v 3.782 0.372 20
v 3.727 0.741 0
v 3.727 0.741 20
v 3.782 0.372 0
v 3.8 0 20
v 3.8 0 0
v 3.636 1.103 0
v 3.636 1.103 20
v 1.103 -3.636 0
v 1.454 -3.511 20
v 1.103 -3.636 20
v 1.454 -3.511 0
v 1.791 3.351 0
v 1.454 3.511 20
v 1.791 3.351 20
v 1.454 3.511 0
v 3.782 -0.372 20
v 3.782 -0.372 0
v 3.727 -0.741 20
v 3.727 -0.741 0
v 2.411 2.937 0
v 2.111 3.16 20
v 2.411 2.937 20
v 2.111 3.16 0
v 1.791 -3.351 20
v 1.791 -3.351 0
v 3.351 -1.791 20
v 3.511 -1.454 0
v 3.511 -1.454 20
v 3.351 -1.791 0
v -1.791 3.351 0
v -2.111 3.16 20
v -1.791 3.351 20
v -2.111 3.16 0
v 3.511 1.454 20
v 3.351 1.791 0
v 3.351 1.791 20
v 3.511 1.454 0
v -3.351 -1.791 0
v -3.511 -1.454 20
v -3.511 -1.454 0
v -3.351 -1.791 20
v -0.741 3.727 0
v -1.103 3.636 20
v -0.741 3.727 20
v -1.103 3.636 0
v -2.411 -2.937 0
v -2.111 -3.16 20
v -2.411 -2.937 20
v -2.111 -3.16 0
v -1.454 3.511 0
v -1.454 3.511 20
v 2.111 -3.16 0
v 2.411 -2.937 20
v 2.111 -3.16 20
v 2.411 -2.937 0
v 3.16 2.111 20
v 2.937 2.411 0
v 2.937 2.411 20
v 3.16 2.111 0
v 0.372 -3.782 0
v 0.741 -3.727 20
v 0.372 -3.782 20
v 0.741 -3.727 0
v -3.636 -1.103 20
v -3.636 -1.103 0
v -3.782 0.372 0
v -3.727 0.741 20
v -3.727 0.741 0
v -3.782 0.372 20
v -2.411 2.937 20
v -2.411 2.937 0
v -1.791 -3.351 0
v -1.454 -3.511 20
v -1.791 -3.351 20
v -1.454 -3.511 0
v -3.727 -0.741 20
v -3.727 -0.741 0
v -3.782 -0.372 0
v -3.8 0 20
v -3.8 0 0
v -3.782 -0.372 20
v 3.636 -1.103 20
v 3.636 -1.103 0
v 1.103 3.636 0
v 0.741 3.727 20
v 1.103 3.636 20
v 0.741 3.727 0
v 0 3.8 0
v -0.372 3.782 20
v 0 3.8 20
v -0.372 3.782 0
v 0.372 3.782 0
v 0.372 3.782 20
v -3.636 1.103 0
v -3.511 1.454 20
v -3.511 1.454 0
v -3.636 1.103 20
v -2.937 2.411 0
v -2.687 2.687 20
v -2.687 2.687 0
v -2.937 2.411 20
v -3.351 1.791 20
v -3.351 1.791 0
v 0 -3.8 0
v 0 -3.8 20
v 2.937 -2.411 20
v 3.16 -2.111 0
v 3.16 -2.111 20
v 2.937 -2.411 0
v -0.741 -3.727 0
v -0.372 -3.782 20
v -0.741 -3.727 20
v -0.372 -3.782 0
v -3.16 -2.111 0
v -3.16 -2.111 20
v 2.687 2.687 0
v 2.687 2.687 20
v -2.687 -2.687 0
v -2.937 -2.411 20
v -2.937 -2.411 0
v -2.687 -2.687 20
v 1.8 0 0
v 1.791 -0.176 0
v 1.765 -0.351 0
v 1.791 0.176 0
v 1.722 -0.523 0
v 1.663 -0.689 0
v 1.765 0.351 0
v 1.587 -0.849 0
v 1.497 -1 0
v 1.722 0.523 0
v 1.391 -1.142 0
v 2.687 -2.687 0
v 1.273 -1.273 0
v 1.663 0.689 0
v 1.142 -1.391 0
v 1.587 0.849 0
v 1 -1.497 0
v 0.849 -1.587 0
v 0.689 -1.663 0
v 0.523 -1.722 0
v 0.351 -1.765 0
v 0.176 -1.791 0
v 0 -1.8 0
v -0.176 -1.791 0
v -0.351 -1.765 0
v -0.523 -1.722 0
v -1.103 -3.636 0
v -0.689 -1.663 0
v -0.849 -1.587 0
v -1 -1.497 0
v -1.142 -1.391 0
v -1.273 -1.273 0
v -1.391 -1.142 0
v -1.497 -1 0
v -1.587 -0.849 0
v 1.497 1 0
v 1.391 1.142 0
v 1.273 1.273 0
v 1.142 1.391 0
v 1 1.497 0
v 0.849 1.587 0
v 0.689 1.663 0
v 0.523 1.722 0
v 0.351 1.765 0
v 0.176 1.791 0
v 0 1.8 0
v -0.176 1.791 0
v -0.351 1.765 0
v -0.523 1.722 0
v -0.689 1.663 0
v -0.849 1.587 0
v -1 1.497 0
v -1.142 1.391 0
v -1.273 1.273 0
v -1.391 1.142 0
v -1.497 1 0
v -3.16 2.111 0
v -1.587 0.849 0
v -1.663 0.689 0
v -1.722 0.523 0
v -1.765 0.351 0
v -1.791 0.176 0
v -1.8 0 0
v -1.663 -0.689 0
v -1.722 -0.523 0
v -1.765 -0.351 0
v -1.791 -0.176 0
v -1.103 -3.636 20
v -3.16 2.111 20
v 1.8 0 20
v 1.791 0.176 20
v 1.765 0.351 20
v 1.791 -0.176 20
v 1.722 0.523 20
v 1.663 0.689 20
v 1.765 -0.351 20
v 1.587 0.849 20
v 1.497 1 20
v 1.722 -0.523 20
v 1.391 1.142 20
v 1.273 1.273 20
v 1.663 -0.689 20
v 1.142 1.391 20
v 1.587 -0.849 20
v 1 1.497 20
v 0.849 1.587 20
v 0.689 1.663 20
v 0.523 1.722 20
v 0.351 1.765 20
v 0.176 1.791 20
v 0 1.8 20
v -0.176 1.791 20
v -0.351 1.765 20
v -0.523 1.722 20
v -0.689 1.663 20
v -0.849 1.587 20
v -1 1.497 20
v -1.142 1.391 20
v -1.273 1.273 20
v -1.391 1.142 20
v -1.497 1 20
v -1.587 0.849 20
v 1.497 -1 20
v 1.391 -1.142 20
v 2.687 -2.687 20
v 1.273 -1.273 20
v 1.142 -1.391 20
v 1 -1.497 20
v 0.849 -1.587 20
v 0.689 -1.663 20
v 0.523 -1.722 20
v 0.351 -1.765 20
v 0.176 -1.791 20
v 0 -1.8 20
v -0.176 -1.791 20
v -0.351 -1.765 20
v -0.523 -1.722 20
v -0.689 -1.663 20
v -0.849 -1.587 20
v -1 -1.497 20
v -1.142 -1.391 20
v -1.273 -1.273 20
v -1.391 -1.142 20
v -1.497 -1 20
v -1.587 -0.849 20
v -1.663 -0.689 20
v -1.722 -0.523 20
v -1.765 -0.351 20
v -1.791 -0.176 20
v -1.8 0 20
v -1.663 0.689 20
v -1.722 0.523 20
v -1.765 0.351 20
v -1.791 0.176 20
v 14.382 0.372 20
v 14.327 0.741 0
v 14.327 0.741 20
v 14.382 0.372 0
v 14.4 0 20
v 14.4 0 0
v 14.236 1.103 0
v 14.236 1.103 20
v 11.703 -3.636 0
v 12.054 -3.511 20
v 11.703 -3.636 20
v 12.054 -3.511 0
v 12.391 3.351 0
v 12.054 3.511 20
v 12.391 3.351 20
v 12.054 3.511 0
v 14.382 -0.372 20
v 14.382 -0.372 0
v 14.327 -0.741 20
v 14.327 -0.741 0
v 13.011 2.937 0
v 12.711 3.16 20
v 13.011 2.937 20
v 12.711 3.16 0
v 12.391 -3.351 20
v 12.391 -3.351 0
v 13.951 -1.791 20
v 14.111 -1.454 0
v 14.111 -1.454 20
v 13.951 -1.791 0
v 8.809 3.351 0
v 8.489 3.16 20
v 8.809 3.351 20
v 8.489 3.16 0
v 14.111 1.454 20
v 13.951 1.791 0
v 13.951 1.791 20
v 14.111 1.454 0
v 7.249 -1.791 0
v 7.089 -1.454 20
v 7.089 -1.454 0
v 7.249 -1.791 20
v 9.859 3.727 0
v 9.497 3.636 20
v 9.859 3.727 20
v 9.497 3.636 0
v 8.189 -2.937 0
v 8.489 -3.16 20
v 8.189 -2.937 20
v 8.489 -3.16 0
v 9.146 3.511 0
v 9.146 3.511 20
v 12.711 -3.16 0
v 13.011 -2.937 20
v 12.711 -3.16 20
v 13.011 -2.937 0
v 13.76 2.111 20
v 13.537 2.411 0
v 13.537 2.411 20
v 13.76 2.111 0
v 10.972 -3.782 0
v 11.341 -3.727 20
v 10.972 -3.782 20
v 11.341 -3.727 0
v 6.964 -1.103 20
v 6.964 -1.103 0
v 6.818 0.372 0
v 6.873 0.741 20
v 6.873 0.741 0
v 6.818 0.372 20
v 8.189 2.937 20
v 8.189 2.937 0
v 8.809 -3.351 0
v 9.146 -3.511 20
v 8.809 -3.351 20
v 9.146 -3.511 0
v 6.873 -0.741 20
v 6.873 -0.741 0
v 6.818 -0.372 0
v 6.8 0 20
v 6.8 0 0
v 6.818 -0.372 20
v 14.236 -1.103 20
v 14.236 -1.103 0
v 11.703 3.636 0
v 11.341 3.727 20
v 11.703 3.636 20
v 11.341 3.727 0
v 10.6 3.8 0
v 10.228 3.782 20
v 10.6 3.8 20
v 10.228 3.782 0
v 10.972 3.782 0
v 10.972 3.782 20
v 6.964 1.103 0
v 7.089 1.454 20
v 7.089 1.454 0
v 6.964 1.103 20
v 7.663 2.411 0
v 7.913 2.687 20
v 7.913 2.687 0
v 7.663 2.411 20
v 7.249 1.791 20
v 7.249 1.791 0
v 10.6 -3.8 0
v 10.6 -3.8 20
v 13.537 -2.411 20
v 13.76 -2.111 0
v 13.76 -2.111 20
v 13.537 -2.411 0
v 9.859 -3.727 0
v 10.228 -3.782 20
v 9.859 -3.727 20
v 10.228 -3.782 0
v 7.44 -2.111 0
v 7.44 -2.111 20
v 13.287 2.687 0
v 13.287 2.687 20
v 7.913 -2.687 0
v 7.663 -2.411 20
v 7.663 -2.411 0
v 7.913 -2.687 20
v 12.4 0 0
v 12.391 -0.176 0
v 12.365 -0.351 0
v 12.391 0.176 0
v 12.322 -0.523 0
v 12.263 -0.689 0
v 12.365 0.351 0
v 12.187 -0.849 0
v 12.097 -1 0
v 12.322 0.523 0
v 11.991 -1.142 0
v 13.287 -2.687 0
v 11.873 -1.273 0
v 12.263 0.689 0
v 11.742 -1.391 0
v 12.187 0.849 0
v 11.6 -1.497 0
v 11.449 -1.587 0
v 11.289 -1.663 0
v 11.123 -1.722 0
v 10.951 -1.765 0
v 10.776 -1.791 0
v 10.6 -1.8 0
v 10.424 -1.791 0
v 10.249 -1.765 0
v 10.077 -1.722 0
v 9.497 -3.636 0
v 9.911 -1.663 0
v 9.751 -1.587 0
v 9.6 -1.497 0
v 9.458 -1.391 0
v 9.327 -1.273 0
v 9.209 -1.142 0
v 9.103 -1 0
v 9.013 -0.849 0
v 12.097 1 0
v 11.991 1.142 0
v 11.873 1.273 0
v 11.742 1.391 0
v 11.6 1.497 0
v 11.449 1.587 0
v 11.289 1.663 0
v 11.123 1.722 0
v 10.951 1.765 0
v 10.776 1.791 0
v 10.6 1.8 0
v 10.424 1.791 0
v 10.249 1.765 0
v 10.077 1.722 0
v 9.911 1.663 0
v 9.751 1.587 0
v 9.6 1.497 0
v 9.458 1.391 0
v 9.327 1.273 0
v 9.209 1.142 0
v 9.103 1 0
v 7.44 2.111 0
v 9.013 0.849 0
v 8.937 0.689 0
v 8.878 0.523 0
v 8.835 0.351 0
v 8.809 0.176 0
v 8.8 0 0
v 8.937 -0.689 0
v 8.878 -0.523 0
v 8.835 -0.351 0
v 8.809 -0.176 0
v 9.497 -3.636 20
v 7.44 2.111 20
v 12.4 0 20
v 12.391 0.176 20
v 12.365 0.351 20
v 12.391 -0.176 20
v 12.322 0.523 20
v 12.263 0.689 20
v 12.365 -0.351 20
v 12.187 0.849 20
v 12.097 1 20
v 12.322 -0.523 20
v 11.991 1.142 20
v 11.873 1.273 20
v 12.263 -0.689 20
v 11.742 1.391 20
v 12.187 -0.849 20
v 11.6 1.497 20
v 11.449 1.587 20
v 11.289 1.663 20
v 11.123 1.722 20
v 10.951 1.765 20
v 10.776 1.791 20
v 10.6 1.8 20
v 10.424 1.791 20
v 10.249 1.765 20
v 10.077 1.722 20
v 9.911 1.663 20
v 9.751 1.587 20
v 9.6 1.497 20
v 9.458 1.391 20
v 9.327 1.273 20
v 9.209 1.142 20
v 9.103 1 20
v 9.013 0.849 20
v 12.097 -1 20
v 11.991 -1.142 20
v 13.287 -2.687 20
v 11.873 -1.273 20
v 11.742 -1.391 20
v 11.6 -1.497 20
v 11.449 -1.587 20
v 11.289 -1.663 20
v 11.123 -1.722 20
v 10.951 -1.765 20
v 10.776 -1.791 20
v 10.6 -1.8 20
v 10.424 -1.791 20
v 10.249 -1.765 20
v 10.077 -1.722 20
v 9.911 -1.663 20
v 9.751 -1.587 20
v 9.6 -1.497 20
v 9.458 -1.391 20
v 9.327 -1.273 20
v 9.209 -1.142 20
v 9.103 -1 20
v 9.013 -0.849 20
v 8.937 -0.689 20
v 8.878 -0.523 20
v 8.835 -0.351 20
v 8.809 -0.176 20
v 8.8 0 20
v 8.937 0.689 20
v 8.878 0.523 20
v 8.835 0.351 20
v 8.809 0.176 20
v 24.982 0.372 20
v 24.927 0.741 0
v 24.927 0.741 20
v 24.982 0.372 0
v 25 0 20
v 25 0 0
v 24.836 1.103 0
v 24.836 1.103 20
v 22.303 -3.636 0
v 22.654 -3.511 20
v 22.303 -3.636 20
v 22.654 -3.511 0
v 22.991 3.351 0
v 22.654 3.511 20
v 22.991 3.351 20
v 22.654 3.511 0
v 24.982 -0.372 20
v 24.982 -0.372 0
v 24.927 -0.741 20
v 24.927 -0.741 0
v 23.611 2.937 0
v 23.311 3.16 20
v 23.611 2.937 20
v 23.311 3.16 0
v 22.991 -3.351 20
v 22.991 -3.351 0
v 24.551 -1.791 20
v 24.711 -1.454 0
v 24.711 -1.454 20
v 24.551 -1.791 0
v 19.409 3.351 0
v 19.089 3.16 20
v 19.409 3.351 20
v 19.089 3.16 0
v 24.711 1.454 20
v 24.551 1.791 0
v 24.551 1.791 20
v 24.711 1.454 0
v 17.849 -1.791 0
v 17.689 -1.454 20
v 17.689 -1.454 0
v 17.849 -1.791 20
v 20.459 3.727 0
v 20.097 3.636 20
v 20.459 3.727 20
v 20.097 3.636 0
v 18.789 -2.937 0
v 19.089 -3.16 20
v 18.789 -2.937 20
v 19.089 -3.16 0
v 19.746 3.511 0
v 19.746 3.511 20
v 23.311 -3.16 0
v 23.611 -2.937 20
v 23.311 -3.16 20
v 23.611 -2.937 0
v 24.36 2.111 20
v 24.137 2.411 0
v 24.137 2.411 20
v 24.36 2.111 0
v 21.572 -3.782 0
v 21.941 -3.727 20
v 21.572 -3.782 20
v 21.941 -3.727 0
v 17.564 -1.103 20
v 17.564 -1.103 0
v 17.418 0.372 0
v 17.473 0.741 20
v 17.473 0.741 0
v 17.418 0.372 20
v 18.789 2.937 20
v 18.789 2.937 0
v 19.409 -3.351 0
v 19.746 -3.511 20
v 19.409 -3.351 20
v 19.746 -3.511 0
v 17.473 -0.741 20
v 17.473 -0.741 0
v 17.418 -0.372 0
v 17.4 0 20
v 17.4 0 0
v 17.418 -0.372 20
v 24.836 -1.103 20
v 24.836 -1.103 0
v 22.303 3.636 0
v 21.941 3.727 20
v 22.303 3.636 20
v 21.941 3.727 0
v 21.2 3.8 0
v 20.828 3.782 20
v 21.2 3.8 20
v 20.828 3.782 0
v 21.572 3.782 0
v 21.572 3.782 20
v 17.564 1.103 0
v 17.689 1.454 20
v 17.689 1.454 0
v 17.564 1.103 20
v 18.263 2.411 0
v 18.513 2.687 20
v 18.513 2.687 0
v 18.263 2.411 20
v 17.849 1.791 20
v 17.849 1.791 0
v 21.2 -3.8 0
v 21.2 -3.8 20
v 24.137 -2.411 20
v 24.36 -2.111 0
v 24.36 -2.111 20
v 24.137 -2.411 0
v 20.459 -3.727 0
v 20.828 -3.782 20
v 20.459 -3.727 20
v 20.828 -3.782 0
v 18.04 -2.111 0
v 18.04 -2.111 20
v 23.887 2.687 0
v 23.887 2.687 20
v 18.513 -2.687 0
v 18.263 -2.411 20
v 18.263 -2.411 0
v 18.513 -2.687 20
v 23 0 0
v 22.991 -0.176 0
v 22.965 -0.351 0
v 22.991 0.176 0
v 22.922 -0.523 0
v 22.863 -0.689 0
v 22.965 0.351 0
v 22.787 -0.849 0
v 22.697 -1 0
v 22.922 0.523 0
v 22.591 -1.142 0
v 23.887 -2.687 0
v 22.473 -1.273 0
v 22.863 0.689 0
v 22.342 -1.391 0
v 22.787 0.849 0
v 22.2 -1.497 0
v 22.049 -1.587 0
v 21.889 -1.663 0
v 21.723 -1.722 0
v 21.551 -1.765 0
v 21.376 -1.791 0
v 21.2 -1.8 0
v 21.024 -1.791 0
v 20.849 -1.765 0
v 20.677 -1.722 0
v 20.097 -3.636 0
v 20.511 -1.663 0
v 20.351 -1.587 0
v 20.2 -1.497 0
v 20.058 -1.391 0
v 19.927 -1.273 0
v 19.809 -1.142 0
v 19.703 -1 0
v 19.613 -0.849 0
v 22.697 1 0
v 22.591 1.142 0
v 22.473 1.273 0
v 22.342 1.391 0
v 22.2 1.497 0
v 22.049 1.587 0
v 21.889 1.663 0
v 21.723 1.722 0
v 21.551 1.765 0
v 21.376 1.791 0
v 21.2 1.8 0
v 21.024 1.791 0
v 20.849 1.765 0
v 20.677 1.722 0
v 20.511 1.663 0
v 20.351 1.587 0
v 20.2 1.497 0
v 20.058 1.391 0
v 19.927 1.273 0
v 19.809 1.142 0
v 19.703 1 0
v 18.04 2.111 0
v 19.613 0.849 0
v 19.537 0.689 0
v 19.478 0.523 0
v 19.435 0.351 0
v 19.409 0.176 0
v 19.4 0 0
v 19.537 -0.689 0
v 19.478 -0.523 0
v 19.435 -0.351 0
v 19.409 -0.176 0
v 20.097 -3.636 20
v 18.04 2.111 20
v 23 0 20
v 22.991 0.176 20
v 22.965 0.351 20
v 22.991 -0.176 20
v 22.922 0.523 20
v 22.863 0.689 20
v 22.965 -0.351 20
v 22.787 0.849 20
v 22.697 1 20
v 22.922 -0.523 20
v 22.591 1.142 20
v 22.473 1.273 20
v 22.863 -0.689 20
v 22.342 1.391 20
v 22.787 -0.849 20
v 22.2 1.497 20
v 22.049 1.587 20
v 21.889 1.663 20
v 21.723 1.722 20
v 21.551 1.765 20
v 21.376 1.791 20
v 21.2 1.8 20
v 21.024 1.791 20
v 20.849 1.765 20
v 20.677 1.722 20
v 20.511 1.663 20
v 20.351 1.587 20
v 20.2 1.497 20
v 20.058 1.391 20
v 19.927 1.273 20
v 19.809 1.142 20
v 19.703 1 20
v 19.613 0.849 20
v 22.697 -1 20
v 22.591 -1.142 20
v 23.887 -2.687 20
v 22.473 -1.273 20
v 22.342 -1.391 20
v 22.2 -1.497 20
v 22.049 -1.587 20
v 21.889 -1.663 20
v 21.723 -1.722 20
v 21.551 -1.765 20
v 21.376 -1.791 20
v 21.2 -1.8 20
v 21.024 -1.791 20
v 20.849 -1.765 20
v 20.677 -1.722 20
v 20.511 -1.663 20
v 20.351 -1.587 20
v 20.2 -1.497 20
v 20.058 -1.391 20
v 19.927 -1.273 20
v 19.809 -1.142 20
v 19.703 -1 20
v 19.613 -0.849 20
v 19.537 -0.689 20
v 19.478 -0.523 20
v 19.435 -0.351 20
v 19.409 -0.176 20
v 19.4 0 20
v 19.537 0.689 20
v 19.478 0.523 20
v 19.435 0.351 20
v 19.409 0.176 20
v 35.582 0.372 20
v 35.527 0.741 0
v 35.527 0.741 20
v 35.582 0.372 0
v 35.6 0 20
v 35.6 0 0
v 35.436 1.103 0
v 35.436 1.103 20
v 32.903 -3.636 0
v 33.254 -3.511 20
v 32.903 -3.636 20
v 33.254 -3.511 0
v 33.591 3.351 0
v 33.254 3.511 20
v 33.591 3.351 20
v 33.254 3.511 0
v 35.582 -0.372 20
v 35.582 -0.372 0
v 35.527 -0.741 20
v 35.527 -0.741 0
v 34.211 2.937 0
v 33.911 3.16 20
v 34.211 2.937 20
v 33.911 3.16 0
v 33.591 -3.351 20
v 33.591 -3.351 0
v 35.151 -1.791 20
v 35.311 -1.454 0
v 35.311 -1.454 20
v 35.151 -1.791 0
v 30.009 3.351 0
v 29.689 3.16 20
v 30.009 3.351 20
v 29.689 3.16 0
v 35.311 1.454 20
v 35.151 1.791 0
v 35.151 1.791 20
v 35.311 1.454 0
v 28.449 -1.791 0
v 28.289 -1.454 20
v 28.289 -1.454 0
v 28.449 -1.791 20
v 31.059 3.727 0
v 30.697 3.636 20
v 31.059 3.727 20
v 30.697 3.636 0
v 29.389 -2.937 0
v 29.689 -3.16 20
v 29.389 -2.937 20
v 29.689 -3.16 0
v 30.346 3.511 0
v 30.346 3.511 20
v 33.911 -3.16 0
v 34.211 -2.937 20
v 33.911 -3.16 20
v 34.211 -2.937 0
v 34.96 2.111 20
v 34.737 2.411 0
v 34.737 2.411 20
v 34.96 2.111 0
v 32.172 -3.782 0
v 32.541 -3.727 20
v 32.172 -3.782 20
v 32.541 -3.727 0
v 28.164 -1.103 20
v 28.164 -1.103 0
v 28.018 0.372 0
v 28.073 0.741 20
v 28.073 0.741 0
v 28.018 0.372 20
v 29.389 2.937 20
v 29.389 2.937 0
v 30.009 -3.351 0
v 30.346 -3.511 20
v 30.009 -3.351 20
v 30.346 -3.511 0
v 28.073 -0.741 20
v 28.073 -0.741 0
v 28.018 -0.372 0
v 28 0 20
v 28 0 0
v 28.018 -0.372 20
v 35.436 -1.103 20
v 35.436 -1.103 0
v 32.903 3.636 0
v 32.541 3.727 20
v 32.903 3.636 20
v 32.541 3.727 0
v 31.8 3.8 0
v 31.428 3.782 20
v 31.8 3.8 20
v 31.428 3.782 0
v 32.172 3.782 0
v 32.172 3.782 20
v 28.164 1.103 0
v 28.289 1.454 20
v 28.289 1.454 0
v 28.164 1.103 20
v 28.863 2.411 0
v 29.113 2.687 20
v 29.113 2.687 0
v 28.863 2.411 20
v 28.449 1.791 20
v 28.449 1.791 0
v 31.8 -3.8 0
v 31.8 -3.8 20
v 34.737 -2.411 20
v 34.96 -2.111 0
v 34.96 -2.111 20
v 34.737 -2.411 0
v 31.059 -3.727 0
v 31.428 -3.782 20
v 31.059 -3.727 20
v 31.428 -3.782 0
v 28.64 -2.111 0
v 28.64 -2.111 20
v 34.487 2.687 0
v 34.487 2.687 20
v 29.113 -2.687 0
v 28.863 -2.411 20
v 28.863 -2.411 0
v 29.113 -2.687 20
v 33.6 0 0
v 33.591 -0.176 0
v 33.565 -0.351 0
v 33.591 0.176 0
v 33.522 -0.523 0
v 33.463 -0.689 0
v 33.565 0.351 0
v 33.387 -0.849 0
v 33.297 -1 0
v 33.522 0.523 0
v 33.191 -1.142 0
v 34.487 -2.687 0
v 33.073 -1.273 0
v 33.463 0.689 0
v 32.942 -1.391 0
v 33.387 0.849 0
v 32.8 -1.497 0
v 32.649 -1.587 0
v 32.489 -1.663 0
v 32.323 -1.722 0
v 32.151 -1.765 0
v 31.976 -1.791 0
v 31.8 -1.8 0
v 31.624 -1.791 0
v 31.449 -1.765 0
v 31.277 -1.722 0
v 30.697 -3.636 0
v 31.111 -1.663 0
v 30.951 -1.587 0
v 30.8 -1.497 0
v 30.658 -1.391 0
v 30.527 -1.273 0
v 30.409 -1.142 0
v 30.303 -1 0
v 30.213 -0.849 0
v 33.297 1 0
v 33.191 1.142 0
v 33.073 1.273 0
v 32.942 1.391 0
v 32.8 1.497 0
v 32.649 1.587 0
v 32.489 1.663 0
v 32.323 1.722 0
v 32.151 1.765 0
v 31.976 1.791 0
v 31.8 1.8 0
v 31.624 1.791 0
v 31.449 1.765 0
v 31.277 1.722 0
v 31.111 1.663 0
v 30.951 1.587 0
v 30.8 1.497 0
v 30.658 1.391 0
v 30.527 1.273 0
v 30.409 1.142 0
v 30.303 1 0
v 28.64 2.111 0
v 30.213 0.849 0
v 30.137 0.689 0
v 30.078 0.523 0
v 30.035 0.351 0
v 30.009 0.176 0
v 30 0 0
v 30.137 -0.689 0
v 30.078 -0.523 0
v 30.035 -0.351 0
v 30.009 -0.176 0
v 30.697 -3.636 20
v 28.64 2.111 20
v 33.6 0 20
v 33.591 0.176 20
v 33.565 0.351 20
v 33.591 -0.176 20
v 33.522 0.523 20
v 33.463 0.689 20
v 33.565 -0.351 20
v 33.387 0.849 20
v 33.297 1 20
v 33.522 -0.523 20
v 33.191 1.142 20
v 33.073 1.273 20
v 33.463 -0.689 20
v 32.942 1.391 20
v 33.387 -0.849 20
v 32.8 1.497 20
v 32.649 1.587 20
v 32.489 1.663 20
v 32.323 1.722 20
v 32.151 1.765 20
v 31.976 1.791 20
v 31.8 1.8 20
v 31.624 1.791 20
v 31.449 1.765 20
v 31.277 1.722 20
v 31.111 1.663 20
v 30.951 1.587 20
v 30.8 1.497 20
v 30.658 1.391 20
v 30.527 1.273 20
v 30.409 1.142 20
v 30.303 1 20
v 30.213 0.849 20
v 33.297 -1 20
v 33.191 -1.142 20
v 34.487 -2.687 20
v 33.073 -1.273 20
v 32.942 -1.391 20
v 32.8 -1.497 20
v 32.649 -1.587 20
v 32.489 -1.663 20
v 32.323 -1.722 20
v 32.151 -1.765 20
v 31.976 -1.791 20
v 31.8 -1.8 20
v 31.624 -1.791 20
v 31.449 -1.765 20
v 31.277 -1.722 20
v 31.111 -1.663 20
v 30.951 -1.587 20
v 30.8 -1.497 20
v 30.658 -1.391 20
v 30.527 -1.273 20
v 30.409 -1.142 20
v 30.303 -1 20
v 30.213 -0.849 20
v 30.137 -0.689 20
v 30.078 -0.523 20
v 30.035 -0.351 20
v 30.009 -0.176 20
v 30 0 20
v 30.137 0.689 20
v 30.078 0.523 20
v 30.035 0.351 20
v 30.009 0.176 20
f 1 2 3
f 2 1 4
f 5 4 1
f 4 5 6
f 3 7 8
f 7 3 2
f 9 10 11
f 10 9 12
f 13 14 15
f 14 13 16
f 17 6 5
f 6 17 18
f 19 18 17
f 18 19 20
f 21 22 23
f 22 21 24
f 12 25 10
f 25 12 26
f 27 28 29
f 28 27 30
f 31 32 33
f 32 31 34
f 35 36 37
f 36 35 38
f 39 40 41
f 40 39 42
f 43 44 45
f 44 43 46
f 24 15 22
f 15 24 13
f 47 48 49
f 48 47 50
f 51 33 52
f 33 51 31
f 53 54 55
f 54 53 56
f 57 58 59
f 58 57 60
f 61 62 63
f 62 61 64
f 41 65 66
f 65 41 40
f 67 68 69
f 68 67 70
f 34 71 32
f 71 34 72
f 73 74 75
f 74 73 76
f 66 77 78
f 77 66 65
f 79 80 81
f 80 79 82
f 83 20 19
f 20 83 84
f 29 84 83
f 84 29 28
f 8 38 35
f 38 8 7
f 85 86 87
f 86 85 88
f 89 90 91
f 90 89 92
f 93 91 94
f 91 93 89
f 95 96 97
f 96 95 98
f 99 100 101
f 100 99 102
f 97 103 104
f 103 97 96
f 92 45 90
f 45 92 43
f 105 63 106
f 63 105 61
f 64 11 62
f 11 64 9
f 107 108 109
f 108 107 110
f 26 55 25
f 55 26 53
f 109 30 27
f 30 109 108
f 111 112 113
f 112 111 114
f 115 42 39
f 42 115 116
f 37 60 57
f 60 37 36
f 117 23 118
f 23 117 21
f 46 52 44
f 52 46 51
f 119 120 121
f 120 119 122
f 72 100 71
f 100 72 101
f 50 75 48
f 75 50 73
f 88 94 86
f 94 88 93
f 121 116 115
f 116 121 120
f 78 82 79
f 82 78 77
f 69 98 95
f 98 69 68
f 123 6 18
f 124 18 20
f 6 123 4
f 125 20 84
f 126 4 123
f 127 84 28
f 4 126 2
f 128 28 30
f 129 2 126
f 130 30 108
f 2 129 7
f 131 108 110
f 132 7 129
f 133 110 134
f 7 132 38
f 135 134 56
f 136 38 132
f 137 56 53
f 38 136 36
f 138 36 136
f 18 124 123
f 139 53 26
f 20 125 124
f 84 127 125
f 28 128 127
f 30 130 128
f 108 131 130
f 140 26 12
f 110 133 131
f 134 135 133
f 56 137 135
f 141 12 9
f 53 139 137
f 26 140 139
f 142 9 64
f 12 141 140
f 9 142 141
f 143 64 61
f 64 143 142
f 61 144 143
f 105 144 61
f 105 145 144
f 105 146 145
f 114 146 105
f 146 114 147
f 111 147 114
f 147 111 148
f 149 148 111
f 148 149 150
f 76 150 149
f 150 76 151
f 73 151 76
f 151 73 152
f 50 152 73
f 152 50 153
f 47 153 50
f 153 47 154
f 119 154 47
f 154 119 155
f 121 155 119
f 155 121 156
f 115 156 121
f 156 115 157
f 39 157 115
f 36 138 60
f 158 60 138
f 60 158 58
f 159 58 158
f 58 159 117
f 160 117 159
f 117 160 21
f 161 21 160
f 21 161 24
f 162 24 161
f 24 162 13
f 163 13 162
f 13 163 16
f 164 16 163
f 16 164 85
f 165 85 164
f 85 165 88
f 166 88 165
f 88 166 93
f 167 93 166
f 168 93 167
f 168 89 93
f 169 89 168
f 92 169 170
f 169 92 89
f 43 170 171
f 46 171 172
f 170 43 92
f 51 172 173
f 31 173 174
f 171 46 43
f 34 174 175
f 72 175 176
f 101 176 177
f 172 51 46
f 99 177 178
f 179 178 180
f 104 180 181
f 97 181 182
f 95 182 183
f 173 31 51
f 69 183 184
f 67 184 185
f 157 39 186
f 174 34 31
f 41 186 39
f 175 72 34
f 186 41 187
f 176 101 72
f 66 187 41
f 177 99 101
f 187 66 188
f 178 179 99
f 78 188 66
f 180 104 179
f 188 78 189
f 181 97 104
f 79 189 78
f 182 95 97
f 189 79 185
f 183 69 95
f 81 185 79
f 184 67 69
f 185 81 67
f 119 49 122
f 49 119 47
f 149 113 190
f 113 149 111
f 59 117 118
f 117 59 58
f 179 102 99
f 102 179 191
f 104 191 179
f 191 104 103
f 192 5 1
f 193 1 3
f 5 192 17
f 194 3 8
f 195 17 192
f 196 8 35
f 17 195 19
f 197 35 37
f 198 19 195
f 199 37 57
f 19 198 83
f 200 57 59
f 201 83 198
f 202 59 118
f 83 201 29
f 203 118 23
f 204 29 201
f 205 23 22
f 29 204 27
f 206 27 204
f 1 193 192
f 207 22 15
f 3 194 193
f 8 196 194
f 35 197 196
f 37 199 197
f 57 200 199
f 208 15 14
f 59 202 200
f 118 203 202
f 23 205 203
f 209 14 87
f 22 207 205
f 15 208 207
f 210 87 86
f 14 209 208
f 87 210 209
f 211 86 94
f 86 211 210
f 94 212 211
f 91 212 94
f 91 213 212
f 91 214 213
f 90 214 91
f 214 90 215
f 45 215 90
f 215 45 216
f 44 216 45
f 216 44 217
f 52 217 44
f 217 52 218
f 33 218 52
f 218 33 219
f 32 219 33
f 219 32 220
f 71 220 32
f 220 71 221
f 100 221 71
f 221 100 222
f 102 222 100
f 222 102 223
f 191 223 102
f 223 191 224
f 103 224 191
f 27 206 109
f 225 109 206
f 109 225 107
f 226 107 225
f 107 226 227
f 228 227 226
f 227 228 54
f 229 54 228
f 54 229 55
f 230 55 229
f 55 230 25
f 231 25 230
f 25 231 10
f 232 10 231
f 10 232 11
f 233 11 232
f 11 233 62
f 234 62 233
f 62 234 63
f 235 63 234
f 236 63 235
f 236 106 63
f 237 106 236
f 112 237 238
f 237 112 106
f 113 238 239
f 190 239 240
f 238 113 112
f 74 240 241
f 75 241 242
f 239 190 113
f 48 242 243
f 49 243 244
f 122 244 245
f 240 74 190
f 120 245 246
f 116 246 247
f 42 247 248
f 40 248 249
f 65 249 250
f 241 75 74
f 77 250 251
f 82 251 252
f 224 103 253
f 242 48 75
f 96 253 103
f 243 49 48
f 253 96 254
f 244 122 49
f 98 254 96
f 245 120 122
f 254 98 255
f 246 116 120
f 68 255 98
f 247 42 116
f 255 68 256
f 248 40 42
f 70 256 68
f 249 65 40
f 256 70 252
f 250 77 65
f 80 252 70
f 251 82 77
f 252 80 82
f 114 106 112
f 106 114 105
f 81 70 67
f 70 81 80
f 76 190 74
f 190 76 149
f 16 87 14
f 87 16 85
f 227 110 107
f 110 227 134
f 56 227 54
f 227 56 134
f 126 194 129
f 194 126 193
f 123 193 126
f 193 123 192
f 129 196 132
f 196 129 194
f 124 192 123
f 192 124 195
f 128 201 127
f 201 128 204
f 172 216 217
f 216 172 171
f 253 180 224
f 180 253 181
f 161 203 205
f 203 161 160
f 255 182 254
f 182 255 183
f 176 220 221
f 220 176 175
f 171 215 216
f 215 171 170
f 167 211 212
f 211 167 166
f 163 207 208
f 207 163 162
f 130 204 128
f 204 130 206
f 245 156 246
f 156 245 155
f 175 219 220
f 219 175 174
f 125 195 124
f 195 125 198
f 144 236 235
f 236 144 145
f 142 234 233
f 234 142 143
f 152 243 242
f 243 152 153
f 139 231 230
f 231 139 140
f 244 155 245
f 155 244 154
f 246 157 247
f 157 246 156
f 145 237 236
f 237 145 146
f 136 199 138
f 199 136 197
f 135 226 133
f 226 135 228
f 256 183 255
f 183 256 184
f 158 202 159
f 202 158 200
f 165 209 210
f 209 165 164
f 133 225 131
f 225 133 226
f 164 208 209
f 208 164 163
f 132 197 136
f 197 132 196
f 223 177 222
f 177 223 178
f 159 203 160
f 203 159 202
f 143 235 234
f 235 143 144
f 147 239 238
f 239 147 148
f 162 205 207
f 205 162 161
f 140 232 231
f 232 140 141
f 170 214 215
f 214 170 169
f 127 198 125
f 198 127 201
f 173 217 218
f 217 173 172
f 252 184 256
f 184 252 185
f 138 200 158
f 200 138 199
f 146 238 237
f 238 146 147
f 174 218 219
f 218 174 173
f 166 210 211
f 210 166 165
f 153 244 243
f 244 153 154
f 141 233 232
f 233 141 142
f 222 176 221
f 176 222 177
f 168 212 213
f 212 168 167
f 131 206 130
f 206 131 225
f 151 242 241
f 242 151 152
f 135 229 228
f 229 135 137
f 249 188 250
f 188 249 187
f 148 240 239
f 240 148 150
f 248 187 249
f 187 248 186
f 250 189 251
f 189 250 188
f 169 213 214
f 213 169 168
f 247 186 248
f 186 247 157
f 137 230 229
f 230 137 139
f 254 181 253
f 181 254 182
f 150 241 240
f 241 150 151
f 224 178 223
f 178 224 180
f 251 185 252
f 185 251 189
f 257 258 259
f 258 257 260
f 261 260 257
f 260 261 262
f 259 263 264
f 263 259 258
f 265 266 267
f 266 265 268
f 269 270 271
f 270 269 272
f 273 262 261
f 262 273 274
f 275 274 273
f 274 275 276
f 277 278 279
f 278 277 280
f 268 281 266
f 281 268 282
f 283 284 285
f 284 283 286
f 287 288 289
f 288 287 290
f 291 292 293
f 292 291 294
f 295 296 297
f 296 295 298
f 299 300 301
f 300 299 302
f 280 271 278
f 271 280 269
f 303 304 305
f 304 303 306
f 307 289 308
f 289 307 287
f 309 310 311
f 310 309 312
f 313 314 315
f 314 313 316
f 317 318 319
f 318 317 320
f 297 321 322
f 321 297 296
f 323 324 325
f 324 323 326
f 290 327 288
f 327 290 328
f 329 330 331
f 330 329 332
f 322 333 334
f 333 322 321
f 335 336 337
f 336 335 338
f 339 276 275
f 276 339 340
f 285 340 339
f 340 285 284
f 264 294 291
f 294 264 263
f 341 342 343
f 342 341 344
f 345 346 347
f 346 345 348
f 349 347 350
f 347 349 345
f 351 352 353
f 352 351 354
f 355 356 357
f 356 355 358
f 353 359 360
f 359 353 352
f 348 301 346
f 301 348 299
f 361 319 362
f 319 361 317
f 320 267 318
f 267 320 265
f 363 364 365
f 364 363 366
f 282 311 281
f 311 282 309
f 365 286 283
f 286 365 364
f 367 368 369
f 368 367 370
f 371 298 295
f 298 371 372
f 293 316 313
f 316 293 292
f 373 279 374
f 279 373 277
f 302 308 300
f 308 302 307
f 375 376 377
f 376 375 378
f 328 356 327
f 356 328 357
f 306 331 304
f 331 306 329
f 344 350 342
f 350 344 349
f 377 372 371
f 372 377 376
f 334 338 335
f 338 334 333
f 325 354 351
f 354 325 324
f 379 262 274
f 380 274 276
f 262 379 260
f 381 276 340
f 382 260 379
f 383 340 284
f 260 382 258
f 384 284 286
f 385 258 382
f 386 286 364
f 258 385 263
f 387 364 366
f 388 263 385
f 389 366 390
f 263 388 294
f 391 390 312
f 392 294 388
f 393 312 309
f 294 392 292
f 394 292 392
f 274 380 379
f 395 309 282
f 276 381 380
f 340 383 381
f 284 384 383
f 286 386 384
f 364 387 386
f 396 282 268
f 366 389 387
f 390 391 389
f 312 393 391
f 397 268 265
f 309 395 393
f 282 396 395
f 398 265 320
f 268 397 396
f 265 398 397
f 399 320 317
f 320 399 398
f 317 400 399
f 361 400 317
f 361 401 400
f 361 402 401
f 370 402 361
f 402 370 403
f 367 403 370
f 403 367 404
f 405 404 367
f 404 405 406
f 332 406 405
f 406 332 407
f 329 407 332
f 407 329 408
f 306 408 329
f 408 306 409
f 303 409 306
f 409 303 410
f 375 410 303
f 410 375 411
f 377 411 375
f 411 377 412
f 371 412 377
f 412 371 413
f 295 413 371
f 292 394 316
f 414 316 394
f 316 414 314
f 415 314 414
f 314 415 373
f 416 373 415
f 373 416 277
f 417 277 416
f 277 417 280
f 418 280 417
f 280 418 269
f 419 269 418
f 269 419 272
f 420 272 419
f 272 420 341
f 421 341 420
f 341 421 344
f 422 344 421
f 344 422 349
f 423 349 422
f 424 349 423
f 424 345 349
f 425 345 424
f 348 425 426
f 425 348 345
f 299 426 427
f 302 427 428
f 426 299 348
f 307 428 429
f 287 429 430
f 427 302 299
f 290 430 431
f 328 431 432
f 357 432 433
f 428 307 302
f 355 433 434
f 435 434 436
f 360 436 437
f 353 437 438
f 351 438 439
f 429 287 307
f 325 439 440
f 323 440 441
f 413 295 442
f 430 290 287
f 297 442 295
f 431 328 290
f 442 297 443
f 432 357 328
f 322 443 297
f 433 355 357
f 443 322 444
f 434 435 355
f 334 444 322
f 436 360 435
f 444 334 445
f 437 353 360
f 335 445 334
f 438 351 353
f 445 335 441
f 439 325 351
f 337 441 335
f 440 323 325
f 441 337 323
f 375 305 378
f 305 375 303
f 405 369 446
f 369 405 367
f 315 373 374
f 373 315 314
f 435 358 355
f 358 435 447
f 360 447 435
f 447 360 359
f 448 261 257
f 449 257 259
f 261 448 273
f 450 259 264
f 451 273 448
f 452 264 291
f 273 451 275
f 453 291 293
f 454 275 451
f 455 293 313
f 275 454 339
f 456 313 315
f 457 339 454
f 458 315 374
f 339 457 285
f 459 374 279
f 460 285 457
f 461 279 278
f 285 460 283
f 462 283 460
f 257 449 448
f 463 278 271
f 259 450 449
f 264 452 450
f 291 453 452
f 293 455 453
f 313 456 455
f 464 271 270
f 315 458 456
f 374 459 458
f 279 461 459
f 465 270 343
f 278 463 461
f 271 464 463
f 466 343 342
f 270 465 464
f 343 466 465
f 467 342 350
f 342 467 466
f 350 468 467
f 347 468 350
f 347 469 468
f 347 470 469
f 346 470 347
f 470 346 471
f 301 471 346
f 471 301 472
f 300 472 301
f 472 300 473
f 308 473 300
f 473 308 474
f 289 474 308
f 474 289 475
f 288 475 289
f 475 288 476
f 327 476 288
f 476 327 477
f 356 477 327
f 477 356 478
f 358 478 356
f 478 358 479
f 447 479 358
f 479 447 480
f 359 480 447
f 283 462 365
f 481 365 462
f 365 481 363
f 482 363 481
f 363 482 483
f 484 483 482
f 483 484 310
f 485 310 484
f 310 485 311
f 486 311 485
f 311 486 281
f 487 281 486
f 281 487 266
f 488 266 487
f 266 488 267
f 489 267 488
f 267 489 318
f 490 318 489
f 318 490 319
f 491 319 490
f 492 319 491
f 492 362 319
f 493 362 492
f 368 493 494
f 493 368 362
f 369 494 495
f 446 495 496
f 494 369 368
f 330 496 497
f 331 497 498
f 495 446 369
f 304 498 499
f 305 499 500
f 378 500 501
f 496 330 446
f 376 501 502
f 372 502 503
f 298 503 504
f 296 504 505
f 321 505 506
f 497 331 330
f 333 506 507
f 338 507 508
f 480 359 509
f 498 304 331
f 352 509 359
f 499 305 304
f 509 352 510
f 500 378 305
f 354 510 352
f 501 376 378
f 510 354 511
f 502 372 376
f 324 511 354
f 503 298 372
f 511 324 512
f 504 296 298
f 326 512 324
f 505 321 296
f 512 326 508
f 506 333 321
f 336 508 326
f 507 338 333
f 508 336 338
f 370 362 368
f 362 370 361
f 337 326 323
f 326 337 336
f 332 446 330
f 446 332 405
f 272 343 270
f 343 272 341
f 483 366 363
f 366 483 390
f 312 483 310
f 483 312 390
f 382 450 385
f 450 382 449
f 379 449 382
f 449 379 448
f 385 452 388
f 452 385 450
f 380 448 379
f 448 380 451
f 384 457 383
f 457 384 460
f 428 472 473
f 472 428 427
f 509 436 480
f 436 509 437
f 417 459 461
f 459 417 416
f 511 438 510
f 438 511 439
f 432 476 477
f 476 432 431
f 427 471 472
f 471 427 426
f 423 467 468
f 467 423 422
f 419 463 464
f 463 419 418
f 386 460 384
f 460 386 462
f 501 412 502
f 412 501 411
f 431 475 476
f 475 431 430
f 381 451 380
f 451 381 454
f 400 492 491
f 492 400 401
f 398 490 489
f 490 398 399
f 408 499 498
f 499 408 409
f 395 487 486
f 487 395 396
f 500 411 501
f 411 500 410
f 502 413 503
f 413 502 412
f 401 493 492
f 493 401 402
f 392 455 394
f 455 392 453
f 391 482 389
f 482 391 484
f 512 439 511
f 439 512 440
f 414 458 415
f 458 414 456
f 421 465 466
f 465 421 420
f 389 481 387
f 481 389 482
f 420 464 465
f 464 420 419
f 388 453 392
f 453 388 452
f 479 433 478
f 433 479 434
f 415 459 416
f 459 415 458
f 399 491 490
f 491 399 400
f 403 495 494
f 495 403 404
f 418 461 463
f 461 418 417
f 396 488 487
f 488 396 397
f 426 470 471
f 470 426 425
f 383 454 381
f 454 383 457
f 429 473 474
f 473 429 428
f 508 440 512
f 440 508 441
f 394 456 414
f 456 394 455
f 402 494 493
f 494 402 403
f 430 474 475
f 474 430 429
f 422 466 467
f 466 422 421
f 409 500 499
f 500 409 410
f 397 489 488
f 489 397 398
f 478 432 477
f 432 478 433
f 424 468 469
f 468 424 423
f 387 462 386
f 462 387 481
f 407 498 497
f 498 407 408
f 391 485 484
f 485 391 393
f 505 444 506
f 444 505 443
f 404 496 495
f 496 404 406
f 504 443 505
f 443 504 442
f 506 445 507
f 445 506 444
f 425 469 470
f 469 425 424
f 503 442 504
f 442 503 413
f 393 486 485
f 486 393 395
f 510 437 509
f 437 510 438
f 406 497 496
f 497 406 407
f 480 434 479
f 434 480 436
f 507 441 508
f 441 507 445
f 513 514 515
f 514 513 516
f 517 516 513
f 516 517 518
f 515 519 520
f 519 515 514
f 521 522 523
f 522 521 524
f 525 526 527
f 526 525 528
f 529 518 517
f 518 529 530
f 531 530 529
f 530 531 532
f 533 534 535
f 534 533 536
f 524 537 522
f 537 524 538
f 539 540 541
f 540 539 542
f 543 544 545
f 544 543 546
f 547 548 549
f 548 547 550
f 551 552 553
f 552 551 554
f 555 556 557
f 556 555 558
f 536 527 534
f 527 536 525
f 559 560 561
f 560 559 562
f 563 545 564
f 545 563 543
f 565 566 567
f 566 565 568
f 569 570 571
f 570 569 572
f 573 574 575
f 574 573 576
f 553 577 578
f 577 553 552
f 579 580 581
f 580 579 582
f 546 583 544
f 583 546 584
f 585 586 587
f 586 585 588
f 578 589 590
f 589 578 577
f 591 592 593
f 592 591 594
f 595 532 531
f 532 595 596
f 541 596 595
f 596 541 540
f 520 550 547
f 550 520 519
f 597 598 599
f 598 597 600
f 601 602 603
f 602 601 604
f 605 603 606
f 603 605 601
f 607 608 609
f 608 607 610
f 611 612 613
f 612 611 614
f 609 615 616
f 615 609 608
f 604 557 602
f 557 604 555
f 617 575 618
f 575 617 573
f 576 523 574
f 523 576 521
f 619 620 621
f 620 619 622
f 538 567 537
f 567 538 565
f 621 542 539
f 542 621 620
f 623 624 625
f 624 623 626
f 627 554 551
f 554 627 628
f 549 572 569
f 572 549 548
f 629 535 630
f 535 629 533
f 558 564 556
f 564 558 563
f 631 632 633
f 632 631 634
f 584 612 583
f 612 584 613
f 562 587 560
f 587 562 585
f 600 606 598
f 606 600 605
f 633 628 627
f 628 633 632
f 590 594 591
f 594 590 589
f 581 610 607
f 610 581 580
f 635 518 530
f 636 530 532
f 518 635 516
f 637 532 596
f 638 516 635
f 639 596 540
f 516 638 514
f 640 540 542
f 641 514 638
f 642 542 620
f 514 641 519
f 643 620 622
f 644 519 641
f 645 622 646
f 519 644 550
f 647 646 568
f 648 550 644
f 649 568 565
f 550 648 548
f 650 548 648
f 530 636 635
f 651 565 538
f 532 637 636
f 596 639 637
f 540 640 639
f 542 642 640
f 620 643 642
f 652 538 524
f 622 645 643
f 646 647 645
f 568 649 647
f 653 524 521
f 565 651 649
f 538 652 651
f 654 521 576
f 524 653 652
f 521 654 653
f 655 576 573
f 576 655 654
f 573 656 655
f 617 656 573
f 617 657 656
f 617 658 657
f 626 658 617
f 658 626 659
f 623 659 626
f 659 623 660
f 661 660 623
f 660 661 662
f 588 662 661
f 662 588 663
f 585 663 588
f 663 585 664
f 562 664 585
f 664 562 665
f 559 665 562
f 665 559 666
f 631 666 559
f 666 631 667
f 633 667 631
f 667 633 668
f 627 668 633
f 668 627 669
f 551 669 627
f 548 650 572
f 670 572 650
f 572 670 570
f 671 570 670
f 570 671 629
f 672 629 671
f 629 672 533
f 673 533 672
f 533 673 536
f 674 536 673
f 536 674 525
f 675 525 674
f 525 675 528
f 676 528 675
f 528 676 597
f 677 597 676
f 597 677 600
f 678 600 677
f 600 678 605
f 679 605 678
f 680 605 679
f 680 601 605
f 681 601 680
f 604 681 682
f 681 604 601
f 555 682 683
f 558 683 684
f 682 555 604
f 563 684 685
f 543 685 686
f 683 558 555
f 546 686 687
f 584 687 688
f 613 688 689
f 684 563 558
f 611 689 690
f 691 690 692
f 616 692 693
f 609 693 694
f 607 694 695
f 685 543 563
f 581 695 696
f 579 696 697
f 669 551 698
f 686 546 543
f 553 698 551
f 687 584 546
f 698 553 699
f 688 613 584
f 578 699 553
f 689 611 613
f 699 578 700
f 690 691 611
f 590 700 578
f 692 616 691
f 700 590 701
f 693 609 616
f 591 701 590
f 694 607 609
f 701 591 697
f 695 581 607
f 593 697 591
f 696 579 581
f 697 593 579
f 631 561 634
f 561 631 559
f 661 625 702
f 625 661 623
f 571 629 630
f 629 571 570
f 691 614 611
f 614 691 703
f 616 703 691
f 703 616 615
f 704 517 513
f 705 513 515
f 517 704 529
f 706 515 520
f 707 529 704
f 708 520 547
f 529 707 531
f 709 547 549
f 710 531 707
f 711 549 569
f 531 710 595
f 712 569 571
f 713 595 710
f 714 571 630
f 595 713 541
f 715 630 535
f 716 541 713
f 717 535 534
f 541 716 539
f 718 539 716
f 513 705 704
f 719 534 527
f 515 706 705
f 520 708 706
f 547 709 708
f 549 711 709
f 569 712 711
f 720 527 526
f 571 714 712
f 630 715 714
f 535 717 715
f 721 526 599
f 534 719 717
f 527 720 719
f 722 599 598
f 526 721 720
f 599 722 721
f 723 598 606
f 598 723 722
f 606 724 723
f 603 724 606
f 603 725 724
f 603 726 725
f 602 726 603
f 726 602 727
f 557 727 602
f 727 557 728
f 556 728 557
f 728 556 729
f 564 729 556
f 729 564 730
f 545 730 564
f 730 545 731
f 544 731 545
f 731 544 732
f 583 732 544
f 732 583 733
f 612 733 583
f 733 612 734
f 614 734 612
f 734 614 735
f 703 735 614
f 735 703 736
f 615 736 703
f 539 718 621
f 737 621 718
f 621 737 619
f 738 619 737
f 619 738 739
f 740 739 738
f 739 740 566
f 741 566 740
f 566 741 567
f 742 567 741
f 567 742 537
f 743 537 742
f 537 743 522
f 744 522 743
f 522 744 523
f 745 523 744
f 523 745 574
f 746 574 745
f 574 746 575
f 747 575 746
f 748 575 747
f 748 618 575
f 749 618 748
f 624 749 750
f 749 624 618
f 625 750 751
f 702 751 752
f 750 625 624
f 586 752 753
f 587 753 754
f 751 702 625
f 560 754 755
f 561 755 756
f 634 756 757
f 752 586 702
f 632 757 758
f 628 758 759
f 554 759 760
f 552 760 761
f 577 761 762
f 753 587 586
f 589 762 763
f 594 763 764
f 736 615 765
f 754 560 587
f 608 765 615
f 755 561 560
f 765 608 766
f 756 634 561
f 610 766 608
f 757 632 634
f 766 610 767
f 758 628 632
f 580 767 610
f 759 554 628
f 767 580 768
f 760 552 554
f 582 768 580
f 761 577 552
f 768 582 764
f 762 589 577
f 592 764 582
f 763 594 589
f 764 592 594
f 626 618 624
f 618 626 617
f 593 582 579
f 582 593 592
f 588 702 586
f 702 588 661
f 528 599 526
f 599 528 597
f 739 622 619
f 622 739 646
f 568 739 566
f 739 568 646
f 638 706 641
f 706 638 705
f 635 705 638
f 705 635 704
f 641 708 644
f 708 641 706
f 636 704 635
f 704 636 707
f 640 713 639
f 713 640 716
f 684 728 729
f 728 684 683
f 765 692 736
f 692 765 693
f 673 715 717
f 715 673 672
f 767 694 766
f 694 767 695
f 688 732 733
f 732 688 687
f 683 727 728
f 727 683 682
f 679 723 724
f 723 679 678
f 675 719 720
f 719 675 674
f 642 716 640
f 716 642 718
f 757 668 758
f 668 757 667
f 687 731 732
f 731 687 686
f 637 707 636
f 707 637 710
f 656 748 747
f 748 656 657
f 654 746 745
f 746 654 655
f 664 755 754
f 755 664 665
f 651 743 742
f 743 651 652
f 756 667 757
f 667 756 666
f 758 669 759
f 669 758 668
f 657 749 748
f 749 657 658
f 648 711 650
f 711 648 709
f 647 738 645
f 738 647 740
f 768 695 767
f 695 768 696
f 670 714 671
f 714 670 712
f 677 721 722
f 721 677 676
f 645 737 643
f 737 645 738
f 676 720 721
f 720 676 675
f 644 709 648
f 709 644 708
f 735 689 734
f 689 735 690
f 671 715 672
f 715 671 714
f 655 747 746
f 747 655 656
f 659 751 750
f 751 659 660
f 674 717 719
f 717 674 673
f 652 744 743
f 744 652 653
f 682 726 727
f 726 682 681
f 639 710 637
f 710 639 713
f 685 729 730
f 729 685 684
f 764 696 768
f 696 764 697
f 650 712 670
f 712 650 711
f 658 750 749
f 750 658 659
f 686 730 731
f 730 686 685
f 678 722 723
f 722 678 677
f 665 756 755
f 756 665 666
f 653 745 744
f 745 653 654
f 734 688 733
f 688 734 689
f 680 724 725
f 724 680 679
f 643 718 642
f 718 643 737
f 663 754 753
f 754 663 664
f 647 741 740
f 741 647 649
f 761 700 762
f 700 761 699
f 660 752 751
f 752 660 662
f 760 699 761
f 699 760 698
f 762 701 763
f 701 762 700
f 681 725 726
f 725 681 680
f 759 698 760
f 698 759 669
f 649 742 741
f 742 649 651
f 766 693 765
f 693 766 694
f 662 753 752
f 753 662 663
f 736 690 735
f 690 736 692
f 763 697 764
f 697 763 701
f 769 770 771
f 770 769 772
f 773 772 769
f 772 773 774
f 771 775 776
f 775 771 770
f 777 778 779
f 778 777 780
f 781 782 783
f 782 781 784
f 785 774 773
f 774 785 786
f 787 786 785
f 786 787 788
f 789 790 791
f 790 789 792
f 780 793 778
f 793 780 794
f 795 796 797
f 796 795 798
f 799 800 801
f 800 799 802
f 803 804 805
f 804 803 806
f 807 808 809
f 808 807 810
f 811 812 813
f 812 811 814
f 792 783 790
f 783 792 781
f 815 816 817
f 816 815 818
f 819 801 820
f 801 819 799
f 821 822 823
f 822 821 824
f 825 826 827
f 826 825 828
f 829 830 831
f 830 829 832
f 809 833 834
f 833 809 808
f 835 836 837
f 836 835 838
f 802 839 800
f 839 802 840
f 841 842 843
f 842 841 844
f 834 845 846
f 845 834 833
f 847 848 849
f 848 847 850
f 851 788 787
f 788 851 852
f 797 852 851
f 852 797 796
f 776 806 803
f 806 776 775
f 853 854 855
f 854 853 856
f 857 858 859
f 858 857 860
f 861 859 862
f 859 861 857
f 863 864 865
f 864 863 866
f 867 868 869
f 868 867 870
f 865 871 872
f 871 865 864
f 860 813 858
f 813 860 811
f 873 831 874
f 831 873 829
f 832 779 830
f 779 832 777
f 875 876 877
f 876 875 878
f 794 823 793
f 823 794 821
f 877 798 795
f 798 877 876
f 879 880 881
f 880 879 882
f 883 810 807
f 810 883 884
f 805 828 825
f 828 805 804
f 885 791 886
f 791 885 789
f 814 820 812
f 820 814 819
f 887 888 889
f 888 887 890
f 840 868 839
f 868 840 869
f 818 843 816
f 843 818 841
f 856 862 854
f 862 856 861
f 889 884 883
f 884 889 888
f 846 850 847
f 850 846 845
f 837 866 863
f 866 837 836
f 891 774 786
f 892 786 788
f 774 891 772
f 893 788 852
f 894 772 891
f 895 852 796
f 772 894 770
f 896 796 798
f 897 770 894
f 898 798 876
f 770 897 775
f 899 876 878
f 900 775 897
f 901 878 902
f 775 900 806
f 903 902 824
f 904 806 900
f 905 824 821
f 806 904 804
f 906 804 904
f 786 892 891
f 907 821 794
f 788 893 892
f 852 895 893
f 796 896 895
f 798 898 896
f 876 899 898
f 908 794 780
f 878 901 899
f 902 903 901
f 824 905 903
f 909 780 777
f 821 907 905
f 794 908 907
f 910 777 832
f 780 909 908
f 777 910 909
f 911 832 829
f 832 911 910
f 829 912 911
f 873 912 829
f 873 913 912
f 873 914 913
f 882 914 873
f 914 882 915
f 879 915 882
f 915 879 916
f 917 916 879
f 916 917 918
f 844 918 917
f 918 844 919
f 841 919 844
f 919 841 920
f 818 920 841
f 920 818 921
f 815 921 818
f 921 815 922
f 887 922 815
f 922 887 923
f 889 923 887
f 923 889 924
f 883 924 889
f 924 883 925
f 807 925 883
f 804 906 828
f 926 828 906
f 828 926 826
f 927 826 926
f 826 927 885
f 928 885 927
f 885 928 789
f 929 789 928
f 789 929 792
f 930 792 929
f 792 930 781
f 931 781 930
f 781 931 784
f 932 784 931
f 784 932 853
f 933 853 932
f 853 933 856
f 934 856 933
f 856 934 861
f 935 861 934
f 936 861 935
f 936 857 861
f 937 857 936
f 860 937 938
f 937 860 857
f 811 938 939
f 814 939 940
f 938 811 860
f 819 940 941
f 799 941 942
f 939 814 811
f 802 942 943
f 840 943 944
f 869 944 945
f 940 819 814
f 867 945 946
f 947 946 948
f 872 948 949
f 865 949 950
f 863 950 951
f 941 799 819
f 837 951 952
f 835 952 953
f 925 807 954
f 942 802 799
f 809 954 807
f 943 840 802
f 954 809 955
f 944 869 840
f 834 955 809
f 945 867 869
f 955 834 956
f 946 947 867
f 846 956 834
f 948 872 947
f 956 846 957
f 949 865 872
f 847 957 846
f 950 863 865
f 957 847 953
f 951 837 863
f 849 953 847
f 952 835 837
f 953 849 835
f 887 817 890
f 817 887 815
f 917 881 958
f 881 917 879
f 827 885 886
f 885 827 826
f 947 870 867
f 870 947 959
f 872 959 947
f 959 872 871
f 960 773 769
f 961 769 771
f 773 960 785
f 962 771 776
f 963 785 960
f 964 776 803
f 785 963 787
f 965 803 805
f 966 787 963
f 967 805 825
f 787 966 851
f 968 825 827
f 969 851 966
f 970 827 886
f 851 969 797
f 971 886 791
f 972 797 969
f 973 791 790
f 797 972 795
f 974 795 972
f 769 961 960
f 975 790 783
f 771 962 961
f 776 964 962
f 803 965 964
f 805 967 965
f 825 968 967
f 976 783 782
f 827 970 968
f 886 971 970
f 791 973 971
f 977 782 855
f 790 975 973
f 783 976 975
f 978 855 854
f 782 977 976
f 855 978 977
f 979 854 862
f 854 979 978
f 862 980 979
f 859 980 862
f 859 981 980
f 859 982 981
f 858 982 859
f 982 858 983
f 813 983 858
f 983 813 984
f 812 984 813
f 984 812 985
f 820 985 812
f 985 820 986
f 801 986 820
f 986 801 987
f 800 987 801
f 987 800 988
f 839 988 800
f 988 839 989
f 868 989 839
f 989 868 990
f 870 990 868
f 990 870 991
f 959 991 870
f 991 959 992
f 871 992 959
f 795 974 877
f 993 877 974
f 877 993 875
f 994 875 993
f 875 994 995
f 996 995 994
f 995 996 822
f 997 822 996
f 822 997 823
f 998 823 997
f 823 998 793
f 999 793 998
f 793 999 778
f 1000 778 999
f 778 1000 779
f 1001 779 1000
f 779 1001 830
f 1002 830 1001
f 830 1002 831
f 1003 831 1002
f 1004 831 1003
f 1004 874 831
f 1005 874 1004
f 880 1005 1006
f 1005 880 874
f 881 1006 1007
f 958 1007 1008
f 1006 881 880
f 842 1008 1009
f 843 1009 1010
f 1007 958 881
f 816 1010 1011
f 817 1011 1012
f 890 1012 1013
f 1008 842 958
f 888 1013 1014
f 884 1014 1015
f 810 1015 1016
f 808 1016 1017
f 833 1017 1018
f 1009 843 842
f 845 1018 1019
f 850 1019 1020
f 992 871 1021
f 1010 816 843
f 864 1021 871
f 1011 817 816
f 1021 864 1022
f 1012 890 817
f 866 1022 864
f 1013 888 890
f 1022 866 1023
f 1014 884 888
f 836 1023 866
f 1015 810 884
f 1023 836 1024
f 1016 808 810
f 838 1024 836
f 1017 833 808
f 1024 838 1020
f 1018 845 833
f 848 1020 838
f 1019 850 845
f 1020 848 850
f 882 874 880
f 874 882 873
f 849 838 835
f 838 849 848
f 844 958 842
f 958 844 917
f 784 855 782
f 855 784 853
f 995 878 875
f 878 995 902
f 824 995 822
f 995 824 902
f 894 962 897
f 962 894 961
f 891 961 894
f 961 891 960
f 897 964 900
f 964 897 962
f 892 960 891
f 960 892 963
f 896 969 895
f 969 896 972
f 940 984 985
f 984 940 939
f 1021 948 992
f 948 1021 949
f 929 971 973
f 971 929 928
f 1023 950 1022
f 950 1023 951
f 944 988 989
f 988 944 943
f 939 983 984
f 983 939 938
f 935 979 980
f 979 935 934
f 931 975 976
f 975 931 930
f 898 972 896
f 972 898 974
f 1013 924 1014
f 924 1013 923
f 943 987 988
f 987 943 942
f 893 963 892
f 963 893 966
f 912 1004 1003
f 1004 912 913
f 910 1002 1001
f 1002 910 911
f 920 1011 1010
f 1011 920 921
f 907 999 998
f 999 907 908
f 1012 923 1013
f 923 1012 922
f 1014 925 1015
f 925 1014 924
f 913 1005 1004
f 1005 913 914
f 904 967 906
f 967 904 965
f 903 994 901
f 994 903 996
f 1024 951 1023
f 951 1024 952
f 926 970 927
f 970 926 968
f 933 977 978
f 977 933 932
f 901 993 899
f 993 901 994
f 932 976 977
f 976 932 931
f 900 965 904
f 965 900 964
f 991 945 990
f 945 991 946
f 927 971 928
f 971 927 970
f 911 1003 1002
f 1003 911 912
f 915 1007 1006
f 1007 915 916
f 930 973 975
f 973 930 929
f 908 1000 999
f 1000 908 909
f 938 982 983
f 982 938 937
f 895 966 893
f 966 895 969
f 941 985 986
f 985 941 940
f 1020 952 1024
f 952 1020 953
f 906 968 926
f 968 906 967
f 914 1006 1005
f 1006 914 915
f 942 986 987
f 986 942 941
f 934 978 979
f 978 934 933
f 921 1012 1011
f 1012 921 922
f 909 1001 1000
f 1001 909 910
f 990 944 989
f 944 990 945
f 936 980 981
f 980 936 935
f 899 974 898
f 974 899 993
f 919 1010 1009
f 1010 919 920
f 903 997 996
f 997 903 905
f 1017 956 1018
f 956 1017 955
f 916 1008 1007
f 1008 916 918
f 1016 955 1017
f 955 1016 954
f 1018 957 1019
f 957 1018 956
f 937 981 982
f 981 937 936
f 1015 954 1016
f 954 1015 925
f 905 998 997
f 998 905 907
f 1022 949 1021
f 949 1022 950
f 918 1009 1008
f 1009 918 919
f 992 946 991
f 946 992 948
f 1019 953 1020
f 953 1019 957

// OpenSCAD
/*
*  Name: screw-washer.scad
*  Description: washer ring
*  Author: Anhtien Nguyen
*  Date: Aug 24, 2018
*/

// inner diameter of washer, default is M3 screw
diameter=3;
// clearance 
gap=0.6; 
// wall thickness between inner & outter wall
thickness=2; 
//  height
height=20; 
// how many copies
qty = 4;

 for (x = [1:1:qty])
    {
    translate([(x-1)*(diameter+gap+thickness+5),0,0]) printWasher();
}

module printWasher(rad = (diameter+gap)/2,thick=thickness,height=height) {
    difference() {
        // outter circle
        cylinder(r=rad+thick,h=height,$fn=64);
        // inner circle
        translate([0,0,-1]) cylinder(r=rad,h=height+2,$fn=64);
    }
}
    
